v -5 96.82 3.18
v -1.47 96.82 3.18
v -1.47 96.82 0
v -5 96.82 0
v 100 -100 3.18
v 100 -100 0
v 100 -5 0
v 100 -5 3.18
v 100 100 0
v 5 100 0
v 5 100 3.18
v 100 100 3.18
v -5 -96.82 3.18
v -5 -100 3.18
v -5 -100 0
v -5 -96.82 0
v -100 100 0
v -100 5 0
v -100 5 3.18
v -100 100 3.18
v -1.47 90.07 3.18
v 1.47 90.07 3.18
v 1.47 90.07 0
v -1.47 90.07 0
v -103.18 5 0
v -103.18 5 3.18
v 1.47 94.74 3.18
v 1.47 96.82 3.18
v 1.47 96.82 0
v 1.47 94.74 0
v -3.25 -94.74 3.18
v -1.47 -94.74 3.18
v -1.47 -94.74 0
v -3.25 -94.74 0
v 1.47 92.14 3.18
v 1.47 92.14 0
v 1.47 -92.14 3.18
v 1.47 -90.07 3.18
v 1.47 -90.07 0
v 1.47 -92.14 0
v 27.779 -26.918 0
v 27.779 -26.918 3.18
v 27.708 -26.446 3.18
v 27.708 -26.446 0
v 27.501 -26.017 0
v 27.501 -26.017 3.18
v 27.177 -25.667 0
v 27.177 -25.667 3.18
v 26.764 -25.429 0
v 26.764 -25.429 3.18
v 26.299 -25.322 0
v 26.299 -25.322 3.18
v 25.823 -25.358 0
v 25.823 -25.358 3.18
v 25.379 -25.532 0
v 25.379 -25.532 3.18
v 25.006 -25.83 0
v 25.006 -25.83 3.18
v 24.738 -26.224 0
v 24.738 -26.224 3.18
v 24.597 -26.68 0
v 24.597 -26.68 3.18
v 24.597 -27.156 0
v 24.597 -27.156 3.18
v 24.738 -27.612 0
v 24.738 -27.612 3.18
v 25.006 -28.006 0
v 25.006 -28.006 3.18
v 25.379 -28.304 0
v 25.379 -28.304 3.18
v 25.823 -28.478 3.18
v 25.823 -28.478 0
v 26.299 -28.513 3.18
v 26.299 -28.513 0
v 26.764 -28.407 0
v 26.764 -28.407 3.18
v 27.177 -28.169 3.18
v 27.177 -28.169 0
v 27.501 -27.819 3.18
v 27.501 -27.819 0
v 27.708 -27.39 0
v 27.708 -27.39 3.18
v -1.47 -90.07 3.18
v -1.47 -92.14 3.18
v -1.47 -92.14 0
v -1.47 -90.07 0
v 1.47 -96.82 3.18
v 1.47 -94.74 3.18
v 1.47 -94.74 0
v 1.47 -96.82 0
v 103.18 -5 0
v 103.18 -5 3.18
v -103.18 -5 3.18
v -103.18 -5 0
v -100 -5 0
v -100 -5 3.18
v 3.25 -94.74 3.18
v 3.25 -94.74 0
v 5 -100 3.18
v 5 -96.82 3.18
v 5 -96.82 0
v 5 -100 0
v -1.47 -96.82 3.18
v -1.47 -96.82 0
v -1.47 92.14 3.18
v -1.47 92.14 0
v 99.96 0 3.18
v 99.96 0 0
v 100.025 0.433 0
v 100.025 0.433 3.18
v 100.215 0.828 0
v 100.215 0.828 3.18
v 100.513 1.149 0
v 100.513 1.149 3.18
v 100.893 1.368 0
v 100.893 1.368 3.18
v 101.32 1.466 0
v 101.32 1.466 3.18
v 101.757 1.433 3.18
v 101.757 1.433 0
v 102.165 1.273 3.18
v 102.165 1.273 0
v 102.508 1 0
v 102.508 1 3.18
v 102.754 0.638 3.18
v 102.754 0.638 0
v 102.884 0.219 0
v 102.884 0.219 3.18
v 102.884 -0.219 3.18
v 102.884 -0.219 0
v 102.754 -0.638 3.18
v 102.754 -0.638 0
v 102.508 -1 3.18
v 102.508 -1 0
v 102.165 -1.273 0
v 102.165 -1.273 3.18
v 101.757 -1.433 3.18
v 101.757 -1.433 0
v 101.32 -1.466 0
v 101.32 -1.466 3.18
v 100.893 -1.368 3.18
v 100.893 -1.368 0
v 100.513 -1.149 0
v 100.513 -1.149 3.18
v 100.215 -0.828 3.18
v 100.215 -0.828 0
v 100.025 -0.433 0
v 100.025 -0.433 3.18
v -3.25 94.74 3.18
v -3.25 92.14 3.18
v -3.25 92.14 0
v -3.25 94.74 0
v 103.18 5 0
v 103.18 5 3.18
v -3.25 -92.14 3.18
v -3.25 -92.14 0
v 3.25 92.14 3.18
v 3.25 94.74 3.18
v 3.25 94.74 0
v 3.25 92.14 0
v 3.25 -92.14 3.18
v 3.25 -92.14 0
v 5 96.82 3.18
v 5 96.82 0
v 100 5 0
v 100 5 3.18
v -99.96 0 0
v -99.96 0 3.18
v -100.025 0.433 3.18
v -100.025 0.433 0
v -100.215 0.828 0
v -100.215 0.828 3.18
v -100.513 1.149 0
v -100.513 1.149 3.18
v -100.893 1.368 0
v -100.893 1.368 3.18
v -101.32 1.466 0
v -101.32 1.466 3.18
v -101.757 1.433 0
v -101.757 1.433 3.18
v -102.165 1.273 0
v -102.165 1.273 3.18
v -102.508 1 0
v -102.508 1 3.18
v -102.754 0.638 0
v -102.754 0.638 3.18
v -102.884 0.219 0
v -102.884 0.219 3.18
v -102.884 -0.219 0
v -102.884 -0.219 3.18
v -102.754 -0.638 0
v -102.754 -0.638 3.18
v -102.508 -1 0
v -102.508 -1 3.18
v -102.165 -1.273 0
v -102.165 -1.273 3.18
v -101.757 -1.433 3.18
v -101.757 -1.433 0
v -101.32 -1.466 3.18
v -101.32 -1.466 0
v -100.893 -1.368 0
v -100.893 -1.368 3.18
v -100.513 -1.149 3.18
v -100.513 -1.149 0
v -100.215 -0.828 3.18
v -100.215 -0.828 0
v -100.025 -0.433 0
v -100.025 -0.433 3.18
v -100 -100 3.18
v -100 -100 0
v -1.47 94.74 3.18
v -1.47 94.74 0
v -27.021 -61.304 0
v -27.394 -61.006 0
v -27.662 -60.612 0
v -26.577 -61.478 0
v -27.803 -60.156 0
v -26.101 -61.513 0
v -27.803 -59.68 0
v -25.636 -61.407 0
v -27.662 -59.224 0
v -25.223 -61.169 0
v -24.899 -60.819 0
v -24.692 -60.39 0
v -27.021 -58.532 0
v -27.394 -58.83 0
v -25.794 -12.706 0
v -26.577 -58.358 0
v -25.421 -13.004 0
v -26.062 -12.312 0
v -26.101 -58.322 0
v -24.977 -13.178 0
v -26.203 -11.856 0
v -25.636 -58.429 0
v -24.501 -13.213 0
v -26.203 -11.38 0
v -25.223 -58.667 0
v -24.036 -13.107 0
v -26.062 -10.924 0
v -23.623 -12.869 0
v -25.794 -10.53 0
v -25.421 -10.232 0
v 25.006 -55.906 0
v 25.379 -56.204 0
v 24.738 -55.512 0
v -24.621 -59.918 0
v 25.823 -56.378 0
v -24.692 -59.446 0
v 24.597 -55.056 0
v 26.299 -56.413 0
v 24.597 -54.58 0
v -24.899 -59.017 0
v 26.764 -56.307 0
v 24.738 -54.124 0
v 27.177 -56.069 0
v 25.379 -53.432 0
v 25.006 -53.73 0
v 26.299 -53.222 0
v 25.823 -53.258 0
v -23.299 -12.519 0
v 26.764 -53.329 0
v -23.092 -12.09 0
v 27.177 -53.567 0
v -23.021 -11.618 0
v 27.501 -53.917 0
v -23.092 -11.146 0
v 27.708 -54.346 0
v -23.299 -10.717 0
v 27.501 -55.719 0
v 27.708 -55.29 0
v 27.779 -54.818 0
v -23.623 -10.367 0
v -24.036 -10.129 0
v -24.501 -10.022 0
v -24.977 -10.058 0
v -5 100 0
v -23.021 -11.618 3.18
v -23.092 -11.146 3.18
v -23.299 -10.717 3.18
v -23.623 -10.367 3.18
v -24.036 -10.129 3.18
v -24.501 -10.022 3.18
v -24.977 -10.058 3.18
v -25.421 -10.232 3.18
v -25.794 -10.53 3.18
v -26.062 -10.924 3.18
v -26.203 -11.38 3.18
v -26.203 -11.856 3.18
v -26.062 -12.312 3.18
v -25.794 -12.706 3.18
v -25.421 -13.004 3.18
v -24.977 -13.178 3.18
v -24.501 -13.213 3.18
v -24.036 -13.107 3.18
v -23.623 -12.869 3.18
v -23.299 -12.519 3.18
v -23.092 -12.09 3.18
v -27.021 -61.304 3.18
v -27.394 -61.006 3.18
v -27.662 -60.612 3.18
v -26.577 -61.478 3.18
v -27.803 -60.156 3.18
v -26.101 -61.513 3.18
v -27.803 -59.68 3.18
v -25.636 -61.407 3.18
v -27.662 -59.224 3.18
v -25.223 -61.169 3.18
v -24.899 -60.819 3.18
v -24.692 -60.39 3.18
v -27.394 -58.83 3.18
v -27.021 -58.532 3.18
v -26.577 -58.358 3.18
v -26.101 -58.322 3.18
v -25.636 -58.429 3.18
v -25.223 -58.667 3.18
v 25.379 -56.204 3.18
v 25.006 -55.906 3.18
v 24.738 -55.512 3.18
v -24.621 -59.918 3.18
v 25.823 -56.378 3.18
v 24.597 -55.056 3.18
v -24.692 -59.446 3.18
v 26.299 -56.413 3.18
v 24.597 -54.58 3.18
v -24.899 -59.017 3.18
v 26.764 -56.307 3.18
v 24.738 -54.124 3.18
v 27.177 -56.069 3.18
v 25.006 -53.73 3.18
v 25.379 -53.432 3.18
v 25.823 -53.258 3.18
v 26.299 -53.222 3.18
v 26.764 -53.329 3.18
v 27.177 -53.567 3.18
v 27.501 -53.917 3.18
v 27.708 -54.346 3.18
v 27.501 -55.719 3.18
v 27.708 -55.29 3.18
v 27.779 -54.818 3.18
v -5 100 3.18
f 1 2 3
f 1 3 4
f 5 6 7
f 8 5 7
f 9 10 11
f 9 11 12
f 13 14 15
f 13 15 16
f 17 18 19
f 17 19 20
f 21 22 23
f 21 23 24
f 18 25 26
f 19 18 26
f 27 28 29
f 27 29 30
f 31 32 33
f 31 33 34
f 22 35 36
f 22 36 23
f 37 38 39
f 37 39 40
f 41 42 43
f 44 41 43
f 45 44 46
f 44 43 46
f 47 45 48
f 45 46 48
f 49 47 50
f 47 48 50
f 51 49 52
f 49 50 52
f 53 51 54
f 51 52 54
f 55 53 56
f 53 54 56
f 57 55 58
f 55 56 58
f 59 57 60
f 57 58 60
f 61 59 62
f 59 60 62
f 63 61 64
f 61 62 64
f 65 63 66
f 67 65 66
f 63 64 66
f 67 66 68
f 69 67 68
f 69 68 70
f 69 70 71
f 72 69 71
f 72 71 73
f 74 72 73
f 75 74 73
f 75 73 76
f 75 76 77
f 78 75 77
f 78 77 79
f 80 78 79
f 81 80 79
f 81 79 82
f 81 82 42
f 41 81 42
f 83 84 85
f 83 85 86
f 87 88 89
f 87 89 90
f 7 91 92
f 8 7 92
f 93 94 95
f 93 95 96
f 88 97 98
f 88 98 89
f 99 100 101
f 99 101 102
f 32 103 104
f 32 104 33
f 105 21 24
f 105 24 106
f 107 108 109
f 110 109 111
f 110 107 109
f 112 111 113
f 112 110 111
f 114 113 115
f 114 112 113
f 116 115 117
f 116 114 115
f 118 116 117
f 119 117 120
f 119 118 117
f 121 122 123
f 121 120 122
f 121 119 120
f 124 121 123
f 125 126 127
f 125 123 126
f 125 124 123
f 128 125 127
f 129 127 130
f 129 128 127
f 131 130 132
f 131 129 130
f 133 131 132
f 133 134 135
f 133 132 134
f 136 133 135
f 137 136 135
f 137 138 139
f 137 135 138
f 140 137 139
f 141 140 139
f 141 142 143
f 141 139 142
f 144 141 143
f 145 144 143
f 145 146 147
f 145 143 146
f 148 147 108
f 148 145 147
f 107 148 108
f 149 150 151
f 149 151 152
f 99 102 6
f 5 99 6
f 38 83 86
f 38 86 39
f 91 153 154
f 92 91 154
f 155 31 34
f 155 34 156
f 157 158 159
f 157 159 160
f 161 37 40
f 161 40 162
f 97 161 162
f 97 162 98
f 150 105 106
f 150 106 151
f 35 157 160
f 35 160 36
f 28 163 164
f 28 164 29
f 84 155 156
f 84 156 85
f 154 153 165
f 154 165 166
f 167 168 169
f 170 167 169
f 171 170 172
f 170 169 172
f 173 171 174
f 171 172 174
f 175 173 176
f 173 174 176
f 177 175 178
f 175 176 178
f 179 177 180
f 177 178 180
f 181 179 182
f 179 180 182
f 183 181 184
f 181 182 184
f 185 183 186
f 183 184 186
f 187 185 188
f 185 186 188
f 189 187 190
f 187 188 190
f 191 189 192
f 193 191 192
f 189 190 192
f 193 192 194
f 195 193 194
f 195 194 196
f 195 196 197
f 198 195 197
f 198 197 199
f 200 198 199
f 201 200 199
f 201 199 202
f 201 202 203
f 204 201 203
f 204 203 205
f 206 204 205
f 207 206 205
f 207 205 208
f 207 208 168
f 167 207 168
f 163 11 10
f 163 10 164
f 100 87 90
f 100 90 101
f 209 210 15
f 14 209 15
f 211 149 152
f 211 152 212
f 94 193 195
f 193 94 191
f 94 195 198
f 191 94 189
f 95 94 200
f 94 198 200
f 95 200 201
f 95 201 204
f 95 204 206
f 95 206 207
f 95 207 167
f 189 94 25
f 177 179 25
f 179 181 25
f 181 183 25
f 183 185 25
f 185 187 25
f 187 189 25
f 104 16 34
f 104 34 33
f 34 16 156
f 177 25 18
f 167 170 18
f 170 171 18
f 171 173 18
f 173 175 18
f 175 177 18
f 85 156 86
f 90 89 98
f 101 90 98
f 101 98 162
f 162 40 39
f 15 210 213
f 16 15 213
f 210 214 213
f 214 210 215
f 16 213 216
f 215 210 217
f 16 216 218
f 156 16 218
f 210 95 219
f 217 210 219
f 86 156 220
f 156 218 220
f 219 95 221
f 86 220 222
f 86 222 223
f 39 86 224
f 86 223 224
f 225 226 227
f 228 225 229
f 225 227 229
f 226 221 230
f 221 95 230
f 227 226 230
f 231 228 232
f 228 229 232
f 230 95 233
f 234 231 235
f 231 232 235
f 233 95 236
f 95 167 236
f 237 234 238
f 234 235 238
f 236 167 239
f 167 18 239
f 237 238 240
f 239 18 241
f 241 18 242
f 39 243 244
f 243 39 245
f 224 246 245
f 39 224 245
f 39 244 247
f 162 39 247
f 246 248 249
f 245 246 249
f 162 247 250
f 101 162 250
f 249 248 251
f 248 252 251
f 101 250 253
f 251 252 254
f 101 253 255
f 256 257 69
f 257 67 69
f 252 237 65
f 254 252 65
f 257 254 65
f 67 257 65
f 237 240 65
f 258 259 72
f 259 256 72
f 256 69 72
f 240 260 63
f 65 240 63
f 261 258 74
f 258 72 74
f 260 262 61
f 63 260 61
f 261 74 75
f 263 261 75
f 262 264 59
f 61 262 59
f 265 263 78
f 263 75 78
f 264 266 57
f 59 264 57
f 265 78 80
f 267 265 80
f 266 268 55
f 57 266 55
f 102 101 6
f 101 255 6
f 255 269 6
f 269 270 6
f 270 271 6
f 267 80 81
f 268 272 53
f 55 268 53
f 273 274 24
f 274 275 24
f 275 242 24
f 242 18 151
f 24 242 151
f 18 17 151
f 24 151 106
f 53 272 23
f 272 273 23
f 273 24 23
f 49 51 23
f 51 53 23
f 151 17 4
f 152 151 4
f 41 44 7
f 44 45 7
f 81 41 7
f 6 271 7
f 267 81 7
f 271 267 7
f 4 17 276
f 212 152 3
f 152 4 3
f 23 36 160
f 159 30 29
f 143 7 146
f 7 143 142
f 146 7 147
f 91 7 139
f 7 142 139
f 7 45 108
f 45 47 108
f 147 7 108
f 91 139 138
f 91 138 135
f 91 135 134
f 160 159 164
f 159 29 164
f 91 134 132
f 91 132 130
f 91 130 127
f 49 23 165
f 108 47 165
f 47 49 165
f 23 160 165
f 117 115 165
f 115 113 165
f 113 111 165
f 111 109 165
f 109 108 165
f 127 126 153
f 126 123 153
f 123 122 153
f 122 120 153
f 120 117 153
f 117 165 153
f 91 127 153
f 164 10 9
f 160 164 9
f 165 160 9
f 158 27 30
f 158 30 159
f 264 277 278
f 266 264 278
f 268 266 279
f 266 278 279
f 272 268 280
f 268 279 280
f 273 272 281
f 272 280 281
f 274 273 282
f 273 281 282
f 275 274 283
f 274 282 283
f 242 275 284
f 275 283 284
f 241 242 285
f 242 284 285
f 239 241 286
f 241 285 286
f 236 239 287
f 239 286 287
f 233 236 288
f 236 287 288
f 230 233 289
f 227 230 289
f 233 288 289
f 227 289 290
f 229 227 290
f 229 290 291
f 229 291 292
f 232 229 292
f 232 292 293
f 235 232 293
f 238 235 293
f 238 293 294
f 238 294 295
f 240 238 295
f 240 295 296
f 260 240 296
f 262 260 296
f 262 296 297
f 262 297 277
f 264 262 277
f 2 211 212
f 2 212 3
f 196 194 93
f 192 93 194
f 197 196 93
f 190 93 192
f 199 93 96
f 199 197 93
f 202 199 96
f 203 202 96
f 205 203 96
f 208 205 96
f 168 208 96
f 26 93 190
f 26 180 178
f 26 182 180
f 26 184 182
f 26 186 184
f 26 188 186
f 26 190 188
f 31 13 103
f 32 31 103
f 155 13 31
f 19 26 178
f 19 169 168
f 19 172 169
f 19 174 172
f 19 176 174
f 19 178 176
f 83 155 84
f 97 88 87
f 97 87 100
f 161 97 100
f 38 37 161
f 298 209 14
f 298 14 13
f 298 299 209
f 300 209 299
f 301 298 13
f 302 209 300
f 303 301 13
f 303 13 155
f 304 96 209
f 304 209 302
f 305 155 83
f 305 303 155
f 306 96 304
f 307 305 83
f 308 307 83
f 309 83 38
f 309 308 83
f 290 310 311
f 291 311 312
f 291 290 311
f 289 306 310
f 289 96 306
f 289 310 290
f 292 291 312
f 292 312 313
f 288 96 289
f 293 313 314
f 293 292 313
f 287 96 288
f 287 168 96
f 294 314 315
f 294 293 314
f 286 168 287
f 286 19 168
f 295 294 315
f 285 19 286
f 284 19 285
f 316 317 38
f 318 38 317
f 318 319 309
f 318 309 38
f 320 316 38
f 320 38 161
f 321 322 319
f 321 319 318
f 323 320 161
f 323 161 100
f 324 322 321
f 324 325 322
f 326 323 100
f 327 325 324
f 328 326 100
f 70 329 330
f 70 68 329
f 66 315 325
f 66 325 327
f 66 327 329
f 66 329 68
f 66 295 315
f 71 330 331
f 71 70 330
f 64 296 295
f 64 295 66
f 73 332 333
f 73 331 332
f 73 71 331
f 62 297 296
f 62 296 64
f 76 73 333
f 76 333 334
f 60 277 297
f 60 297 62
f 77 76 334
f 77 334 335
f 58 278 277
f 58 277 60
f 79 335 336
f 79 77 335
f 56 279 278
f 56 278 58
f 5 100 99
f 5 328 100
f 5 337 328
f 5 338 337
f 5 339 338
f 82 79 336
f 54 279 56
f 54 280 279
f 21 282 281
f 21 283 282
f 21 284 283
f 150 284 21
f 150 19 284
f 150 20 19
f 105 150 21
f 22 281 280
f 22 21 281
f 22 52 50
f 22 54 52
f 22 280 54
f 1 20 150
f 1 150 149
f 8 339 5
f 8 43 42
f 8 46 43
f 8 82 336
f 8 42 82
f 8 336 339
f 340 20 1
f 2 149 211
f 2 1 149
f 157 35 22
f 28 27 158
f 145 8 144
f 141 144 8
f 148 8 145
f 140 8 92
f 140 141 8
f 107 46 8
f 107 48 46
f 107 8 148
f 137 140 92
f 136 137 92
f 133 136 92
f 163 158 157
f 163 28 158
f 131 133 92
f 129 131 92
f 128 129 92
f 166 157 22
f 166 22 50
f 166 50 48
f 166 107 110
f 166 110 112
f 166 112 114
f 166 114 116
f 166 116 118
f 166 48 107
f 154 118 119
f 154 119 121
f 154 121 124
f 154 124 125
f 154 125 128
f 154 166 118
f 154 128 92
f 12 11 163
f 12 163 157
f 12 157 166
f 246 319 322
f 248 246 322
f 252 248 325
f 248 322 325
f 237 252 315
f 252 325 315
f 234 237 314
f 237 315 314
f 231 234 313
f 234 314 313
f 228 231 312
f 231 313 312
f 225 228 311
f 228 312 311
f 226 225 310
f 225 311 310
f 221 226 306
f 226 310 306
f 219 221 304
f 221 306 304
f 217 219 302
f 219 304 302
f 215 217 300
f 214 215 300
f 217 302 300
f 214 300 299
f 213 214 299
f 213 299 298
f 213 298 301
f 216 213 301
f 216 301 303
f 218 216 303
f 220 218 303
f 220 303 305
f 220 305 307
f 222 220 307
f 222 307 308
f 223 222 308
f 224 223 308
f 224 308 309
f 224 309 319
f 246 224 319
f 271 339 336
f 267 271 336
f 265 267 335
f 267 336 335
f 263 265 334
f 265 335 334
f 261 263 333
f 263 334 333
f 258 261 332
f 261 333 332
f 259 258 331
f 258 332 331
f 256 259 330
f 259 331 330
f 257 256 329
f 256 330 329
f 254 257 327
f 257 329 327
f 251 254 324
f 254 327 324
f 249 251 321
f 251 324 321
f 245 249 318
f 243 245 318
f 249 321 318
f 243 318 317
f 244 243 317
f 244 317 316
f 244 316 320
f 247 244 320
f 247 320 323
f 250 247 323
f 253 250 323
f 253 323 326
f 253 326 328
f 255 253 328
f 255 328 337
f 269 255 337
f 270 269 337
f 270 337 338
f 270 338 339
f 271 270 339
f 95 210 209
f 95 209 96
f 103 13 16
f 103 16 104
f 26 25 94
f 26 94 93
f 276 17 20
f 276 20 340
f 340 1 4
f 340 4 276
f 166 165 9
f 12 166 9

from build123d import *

# Parameters (mm, degrees)
SKETCH2_W           = 200
SKETCH2_H           = 200
BOSS_EXTRUDE1_DEPTH = 3.18
CUT_EXTRUDE1_DEPTH  = 142.457104452
SKETCH4_W           = 3.18
SKETCH4_H           = 10
BOSS_EXTRUDE2_DEPTH = 3.18
SKETCH6_R           = 1.47
CUT_EXTRUDE2_DEPTH  = 144.722735849
SKETCH7_R           = 1.6
CUT_EXTRUDE3_DEPTH  = 144.722735849


with BuildPart() as part:
    # Sketch2 → Boss-Extrude1 (new body)
    with BuildSketch(Plane.XY):
        Rectangle(SKETCH2_W, SKETCH2_H)
    extrude(amount=BOSS_EXTRUDE1_DEPTH)

    # Sketch3 → Cut-Extrude1 (cut, through all)
    with BuildSketch(Plane.XY.offset(3.18)):
        Polygon((-5, 100), (5, 100), (5, 96.82), (1.47, 96.82), (1.47, 94.74), (3.25, 94.74), (3.25, 92.14), (1.47, 92.14), (1.47, 90.07), (-1.47, 90.07), (-1.47, 92.14), (-3.25, 92.14), (-3.25, 94.74), (-1.47, 94.74), (-1.47, 96.82), (-5, 96.82), align=None)
        Polygon((1.47, -96.82), (5, -96.82), (5, -100), (-5, -100), (-5, -96.82), (-1.47, -96.82), (-1.47, -94.74), (-3.25, -94.74), (-3.25, -92.14), (-1.47, -92.14), (-1.47, -90.07), (1.47, -90.07), (1.47, -92.14), (3.25, -92.14), (3.25, -94.74), (1.47, -94.74), align=None)
    extrude(amount=-CUT_EXTRUDE1_DEPTH, mode=Mode.SUBTRACT)

    # Sketch4 → Boss-Extrude2 (add)
    with BuildSketch(Plane.ZY.offset(100)):
        with Locations((1.59, 0)):
            Rectangle(SKETCH4_W, SKETCH4_H)
    boss_extrude2 = extrude(amount=BOSS_EXTRUDE2_DEPTH)

    # Sketch6 → Cut-Extrude2 (cut, through all)
    with BuildSketch(Plane.XY.offset(3.18)):
        with Locations((-101.43, 0)):
            Circle(SKETCH6_R)
    cut_extrude2 = extrude(amount=-CUT_EXTRUDE2_DEPTH, mode=Mode.SUBTRACT)

    # Mirror1: Boss-Extrude2 across plane
    add(boss_extrude2.mirror(Plane(origin=(0, 0, 0), x_dir=(0, 0, 1), z_dir=(1, 0, 0))))

    # Mirror2: Cut-Extrude2 across plane
    add(cut_extrude2.mirror(Plane(origin=(0, 0, 0), x_dir=(0, 0, 1), z_dir=(1, 0, 0))), mode=Mode.SUBTRACT)

    # Sketch7 → Cut-Extrude3 (cut, through all)
    with BuildSketch(Plane.XY.offset(3.18)):
        with Locations((26.179371117, -54.817968537)):
            Circle(SKETCH7_R)
        with Locations((26.179371117, -26.917968537)):
            Circle(SKETCH7_R)
        with Locations((-24.620628883, -11.617968537)):
            Circle(SKETCH7_R)
        with Locations((-26.220628883, -59.917968537)):
            Circle(SKETCH7_R)
    extrude(amount=-CUT_EXTRUDE3_DEPTH, mode=Mode.SUBTRACT)


solid = part.part
